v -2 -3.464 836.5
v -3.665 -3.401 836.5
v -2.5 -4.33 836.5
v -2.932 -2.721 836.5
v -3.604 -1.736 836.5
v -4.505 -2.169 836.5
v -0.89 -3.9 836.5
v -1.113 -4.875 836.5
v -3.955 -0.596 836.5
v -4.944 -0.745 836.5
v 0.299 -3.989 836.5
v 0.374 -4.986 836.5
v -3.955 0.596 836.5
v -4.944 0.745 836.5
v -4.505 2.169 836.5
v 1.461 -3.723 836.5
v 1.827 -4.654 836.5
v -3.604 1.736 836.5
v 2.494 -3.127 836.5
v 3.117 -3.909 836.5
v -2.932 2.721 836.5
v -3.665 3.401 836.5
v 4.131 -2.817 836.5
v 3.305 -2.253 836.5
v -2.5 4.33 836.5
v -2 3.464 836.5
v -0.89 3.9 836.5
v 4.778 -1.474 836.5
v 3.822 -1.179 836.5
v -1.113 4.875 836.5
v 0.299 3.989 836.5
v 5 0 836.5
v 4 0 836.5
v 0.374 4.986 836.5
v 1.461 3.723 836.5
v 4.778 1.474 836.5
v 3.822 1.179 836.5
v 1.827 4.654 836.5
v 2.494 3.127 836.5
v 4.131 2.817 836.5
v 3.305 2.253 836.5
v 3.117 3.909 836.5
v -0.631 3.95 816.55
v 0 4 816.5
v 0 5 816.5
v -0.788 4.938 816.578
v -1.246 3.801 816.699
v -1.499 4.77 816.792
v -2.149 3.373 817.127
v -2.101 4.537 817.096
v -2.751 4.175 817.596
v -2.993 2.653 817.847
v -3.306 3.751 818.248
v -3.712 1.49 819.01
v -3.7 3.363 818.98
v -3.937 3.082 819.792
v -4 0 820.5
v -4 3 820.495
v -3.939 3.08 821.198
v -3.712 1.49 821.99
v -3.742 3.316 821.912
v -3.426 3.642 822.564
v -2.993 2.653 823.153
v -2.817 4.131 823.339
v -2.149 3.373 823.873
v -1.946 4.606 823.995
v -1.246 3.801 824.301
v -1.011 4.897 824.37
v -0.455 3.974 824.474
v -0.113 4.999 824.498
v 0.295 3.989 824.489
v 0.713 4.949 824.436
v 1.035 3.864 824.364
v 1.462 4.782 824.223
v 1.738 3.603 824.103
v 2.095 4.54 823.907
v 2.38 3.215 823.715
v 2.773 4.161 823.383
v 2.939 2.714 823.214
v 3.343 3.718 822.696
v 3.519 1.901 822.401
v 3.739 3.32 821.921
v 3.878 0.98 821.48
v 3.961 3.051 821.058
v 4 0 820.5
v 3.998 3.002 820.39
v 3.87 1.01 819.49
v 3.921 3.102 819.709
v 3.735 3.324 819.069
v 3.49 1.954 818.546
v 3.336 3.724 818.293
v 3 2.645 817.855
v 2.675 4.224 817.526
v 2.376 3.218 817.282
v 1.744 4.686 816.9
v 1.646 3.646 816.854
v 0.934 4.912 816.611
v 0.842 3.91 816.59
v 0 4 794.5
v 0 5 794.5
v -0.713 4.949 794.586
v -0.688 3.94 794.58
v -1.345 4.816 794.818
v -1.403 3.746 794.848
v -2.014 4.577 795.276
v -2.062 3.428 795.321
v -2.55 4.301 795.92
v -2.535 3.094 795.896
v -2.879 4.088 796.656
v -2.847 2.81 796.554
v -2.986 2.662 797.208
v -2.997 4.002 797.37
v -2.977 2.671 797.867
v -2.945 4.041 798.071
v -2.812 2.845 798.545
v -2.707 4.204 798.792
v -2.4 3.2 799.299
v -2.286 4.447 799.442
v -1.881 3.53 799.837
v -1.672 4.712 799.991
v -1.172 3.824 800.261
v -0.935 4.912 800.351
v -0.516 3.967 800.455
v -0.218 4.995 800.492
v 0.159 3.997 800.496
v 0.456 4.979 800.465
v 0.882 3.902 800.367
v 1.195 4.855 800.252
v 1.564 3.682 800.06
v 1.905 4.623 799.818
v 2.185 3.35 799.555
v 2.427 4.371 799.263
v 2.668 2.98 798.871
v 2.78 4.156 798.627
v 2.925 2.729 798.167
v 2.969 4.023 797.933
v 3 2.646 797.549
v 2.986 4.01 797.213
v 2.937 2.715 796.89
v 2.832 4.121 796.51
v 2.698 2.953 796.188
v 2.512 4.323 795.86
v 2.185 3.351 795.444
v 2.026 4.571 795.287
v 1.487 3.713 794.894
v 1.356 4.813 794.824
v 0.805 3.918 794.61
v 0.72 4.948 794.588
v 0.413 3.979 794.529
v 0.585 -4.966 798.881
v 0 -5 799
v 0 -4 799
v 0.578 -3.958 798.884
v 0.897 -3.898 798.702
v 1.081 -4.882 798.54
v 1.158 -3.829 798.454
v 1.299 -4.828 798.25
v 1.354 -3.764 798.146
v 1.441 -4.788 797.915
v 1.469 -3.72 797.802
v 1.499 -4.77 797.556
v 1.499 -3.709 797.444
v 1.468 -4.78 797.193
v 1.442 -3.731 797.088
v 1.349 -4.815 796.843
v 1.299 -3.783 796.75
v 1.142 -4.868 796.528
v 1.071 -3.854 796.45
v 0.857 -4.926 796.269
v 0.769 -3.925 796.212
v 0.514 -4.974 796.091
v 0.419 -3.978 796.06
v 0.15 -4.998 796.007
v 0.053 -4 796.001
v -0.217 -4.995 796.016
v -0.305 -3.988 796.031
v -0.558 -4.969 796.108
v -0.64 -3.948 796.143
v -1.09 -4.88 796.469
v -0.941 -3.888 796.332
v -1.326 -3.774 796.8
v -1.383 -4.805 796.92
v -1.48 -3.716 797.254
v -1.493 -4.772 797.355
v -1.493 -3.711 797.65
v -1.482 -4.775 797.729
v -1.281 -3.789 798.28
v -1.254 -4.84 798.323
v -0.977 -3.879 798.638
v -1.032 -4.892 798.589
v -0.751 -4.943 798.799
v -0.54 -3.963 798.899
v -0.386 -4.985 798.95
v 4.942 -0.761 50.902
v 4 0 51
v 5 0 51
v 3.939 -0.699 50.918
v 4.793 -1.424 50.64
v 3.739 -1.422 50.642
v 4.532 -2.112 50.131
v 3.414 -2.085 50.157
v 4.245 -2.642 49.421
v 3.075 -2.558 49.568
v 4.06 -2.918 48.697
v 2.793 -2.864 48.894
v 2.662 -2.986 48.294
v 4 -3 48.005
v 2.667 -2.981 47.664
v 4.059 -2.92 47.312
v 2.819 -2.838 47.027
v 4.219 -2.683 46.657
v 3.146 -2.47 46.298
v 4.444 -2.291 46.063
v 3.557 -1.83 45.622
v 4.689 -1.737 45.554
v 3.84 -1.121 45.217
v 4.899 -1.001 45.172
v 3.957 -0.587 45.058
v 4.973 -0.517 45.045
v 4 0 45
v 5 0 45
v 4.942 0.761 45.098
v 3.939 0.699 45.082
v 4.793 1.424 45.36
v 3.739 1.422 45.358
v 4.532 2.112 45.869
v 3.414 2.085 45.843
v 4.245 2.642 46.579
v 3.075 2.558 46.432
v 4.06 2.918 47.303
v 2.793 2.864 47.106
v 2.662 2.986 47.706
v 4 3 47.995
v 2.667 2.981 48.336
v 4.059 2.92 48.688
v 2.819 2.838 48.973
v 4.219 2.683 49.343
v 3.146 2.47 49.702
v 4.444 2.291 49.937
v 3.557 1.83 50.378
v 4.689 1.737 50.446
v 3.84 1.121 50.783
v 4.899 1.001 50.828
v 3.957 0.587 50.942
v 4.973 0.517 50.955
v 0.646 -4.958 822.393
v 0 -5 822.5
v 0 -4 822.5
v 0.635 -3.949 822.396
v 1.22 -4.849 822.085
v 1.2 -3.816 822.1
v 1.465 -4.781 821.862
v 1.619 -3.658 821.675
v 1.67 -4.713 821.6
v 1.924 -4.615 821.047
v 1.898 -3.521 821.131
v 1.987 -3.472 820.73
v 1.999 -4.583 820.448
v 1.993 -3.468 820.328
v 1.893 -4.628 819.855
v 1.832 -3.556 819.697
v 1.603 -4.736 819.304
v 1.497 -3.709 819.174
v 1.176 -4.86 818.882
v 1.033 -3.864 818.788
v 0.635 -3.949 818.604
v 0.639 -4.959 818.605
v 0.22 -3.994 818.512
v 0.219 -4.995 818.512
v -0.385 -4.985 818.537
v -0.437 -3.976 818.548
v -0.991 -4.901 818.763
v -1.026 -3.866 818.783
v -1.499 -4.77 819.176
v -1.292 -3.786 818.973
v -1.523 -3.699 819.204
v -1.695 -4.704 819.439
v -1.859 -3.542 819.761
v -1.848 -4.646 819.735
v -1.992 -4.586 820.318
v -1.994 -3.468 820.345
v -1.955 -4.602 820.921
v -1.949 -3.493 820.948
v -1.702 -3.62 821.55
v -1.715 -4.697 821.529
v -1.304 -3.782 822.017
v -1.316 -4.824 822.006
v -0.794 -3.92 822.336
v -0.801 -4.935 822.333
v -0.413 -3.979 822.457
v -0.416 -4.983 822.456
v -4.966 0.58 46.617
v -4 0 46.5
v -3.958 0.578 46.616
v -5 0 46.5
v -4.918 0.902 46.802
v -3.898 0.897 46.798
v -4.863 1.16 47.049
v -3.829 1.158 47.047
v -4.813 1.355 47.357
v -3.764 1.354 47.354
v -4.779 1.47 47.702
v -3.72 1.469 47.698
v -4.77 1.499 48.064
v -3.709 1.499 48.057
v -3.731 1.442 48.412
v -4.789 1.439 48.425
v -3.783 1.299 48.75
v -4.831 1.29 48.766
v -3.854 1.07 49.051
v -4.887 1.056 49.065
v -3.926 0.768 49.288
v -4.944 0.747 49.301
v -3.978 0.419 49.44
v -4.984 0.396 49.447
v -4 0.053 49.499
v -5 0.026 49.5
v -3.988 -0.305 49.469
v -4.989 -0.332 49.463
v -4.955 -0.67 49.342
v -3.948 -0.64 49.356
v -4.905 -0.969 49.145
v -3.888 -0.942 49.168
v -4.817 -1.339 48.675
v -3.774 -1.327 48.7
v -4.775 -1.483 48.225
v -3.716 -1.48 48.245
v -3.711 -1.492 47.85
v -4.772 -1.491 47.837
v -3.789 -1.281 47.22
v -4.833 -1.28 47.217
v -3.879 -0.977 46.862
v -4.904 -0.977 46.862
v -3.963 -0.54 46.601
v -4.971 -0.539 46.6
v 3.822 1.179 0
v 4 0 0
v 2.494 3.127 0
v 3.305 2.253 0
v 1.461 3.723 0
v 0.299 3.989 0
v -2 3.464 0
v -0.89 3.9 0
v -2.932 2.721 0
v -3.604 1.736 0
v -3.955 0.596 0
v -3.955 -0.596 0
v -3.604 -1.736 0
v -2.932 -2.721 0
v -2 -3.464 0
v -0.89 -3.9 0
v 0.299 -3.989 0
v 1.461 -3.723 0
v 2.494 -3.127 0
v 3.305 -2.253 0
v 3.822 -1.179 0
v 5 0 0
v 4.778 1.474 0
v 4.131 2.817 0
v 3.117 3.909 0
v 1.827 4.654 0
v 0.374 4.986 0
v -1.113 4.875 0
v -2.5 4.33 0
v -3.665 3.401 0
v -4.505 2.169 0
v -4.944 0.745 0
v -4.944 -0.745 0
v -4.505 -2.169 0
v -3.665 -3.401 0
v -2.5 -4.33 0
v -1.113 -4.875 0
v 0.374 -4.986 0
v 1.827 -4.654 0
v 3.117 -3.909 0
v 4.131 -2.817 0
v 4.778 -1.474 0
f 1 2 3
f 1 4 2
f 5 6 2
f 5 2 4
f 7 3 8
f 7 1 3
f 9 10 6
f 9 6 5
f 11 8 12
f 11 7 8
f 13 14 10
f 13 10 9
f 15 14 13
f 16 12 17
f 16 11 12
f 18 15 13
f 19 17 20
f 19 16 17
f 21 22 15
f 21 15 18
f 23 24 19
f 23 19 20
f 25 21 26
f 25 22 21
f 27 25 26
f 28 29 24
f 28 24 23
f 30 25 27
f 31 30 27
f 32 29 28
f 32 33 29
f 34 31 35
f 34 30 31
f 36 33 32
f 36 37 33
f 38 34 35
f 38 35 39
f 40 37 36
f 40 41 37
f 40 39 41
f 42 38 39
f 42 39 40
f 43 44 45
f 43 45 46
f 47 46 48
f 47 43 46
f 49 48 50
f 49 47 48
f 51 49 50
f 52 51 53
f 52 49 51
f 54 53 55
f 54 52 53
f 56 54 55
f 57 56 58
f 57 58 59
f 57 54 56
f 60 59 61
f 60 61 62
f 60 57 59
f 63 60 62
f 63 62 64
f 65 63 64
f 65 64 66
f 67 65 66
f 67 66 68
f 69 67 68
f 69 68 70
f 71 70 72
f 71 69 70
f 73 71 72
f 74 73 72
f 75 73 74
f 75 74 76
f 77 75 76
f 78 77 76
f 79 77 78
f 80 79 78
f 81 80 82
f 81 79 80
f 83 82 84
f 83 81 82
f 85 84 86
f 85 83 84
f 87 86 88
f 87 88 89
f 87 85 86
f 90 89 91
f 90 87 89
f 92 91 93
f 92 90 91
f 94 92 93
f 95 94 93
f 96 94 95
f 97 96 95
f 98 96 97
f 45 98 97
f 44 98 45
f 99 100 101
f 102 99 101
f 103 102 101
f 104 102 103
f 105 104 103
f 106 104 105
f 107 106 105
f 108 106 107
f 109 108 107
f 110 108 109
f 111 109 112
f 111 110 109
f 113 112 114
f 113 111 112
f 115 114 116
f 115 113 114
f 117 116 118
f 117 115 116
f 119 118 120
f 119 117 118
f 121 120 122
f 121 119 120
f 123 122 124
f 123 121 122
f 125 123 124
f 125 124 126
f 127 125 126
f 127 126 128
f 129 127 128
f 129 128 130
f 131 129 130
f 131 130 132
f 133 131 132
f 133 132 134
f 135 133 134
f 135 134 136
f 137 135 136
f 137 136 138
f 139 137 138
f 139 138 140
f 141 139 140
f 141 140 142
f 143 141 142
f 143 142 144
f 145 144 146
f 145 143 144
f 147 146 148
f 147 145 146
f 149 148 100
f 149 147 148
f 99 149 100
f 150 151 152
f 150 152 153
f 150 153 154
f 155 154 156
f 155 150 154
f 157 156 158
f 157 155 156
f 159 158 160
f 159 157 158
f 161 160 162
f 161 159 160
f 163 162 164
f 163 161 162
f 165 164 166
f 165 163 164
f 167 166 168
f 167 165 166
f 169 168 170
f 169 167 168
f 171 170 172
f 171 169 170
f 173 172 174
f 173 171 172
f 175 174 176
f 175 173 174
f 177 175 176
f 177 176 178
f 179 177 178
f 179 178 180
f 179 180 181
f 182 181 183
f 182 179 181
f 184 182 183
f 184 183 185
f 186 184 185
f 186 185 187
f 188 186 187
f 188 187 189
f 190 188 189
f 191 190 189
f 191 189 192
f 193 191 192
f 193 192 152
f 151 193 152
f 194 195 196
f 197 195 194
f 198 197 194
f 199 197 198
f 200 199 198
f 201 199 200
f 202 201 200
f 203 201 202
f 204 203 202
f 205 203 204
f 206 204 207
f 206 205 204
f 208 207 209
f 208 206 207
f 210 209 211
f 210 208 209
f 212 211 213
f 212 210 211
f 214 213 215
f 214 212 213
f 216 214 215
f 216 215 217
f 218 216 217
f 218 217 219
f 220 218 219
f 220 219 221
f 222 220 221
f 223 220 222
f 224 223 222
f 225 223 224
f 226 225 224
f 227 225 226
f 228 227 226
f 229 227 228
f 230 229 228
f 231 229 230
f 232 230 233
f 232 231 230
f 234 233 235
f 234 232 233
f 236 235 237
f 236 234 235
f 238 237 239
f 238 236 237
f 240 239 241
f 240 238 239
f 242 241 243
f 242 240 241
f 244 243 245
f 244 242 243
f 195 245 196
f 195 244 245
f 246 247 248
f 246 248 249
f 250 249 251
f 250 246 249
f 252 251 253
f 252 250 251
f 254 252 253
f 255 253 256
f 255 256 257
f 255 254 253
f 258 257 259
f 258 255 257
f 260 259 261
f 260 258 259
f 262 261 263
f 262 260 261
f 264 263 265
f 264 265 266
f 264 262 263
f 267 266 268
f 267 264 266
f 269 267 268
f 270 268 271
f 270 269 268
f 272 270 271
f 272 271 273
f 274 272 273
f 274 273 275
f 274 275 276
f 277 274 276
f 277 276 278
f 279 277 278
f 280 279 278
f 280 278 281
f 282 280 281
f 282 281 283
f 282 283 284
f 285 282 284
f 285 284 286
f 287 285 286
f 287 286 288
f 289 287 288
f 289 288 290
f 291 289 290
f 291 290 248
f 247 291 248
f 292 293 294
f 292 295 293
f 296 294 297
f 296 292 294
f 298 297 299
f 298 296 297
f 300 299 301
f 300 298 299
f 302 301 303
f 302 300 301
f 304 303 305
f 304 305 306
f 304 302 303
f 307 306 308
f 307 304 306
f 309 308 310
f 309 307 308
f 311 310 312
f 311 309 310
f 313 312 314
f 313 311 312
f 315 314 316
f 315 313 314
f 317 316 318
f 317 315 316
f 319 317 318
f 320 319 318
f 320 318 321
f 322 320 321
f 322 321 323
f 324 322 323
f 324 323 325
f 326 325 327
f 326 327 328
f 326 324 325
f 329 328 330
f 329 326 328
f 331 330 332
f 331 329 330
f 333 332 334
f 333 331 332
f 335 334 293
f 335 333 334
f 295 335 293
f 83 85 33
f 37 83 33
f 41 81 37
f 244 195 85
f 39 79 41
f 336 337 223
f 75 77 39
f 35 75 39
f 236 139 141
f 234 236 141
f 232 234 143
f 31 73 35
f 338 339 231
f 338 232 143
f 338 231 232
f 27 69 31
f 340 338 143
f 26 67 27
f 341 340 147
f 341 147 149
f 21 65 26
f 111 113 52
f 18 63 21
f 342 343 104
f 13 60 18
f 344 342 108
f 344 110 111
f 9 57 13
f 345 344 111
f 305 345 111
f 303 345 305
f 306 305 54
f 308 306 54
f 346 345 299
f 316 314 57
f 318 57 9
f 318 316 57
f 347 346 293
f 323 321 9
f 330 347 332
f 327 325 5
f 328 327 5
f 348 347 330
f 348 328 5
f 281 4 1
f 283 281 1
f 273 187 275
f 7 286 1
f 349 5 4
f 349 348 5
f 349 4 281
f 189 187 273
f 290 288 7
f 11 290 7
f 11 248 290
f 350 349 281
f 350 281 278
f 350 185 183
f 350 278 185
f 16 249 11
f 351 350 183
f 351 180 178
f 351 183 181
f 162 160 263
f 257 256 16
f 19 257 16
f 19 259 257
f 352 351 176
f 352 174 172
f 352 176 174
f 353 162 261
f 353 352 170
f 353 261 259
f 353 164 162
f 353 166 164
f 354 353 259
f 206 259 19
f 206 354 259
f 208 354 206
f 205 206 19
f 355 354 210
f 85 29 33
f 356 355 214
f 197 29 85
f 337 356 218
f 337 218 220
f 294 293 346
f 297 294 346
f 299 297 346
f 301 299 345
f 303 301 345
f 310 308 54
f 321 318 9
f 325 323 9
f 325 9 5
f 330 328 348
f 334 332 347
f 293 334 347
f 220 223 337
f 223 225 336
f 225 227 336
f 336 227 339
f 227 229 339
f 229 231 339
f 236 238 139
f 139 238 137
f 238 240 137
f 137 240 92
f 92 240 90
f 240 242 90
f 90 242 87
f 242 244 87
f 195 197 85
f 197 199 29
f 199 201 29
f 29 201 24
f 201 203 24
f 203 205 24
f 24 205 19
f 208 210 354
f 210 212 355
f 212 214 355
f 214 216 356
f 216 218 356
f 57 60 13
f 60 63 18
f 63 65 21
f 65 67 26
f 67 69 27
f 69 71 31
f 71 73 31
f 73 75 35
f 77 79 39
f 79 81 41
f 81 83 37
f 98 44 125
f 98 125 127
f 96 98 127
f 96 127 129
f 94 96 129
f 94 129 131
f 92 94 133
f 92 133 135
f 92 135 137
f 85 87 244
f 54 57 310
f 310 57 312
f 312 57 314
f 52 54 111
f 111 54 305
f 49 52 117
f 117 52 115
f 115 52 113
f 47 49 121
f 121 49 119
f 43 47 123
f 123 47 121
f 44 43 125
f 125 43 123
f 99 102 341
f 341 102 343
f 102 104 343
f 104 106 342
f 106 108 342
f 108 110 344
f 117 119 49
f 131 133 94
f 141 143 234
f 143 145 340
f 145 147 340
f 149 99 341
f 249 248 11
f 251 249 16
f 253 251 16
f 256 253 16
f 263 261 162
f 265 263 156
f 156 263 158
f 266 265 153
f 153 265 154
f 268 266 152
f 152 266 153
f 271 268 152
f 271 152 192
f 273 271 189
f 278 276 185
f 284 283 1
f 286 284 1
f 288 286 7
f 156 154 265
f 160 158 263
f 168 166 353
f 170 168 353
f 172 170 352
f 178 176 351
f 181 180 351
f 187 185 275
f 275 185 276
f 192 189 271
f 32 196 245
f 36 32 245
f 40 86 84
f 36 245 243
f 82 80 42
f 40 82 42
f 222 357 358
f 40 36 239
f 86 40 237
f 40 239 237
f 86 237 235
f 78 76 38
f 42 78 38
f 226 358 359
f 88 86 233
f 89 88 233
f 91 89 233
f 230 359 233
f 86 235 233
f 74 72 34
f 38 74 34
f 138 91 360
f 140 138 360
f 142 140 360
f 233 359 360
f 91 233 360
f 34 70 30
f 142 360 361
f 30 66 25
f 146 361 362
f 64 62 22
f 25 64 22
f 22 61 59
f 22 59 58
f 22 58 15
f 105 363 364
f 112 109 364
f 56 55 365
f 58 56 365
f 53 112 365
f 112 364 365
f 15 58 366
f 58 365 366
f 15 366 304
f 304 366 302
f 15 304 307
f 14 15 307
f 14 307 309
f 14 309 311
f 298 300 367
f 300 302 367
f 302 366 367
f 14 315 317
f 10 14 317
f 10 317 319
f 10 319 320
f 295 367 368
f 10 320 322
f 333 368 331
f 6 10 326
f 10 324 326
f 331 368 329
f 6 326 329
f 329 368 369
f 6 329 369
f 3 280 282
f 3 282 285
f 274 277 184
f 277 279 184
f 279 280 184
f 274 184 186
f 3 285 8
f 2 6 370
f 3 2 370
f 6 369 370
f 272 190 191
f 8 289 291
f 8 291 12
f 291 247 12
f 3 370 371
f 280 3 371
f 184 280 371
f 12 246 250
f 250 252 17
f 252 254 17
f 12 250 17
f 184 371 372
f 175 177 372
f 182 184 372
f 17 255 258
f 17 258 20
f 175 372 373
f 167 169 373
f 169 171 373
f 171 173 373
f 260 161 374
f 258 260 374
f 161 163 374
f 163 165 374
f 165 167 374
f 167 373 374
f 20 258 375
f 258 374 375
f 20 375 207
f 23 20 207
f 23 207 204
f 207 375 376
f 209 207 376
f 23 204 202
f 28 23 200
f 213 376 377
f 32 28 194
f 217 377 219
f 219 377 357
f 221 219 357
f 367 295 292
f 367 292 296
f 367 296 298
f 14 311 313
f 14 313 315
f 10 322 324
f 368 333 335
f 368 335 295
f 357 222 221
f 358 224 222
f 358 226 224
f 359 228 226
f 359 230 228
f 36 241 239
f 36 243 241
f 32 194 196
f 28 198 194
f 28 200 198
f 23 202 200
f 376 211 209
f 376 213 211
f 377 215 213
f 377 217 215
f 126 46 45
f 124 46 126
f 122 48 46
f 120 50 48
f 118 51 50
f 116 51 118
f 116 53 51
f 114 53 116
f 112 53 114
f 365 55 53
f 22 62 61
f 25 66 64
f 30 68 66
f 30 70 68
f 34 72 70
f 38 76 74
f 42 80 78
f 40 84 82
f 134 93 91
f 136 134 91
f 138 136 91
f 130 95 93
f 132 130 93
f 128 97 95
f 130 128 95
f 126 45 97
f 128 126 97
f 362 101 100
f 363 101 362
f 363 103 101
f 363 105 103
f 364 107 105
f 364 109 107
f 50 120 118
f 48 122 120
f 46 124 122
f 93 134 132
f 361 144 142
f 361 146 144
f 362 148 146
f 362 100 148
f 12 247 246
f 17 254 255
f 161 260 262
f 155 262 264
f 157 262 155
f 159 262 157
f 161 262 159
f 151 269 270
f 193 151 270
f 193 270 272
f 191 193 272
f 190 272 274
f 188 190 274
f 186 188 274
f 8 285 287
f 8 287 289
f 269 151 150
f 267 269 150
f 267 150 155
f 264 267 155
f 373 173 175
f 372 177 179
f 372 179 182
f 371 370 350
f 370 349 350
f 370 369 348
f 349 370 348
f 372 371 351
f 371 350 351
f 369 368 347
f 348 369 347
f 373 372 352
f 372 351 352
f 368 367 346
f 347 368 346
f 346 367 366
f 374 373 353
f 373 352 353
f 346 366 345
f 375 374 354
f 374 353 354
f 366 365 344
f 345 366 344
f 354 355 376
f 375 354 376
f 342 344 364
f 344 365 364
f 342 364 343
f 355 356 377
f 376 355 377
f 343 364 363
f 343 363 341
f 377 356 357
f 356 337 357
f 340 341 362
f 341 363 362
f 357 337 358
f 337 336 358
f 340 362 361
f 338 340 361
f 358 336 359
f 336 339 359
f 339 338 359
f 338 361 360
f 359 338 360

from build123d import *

# Parameters (mm, degrees)
SKETCH_1_R               = 5
SKETCH_1_R_2             = 4
EXTRUDE_1_DEPTH          = 836.5
CUT_EXTRUDE_1_DEPTH      = 837.529885898
CUT_EXTRUDE_1_DEPTH_BACK = 837.529885898
SKETCH_2_R               = 2
SKETCH_2_R_2             = 1.5
SKETCH_2_3_R             = 4
SKETCH_2_3_R_2           = 3
CUT_EXTRUDE_2_DEPTH      = 837.529885999
CUT_EXTRUDE_3_DEPTH      = 837.529885999
CUT_EXTRUDE_3_DEPTH_BACK = 837.529885999
SKETCH_3_R               = 1.5
SKETCH_3_3_R             = 3
CUT_EXTRUDE_4_DEPTH      = 10


with BuildPart() as part:
    # ｽｹｯﾁ1 → 押し出し-薄板1 (new body)
    with BuildSketch(Plane.XY):
        Circle(SKETCH_1_R)
        Circle(SKETCH_1_R_2, mode=Mode.SUBTRACT)
    extrude(amount=EXTRUDE_1_DEPTH)

    # ｽｹｯﾁ2 → ｶｯﾄ - 押し出し1 (cut, two sides: drawn at the far end of the back side and taken through both)
    with BuildSketch(Plane(origin=(0, 0, 0), x_dir=(1, 0, 0), z_dir=(0, 1, 0)).offset(-CUT_EXTRUDE_1_DEPTH_BACK)):
        with Locations((0, -820.5)):
            Circle(SKETCH_2_R)
        with Locations((0, -797.5)):
            Circle(SKETCH_2_R_2)
    extrude(amount=CUT_EXTRUDE_1_DEPTH + CUT_EXTRUDE_1_DEPTH_BACK, mode=Mode.SUBTRACT)

    # ｽｹｯﾁ2<3> → ｶｯﾄ - 押し出し2 (cut, through all)
    with BuildSketch(Plane(origin=(0, 0, 0), x_dir=(1, 0, 0), z_dir=(0, 1, 0))):
        with Locations((0, -820.5)):
            Circle(SKETCH_2_3_R)
        with Locations((0, -797.5)):
            Circle(SKETCH_2_3_R_2)
    extrude(amount=CUT_EXTRUDE_2_DEPTH, mode=Mode.SUBTRACT)

    # ｽｹｯﾁ3 → ｶｯﾄ - 押し出し3 (cut, two sides: drawn at the far end of the back side and taken through both)
    with BuildSketch(Plane(origin=(0, 0, 0), x_dir=(0, 0, -1), z_dir=(1, 0, 0)).offset(-CUT_EXTRUDE_3_DEPTH_BACK)):
        with Locations((-48, 0)):
            Circle(SKETCH_3_R)
    extrude(amount=CUT_EXTRUDE_3_DEPTH + CUT_EXTRUDE_3_DEPTH_BACK, mode=Mode.SUBTRACT)

    # ｽｹｯﾁ3<3> → ｶｯﾄ - 押し出し4 (cut)
    with BuildSketch(Plane(origin=(0, 0, 0), x_dir=(0, 0, -1), z_dir=(1, 0, 0))):
        with Locations((-48, 0)):
            Circle(SKETCH_3_3_R)
    extrude(amount=CUT_EXTRUDE_4_DEPTH, mode=Mode.SUBTRACT)


solid = part.part
